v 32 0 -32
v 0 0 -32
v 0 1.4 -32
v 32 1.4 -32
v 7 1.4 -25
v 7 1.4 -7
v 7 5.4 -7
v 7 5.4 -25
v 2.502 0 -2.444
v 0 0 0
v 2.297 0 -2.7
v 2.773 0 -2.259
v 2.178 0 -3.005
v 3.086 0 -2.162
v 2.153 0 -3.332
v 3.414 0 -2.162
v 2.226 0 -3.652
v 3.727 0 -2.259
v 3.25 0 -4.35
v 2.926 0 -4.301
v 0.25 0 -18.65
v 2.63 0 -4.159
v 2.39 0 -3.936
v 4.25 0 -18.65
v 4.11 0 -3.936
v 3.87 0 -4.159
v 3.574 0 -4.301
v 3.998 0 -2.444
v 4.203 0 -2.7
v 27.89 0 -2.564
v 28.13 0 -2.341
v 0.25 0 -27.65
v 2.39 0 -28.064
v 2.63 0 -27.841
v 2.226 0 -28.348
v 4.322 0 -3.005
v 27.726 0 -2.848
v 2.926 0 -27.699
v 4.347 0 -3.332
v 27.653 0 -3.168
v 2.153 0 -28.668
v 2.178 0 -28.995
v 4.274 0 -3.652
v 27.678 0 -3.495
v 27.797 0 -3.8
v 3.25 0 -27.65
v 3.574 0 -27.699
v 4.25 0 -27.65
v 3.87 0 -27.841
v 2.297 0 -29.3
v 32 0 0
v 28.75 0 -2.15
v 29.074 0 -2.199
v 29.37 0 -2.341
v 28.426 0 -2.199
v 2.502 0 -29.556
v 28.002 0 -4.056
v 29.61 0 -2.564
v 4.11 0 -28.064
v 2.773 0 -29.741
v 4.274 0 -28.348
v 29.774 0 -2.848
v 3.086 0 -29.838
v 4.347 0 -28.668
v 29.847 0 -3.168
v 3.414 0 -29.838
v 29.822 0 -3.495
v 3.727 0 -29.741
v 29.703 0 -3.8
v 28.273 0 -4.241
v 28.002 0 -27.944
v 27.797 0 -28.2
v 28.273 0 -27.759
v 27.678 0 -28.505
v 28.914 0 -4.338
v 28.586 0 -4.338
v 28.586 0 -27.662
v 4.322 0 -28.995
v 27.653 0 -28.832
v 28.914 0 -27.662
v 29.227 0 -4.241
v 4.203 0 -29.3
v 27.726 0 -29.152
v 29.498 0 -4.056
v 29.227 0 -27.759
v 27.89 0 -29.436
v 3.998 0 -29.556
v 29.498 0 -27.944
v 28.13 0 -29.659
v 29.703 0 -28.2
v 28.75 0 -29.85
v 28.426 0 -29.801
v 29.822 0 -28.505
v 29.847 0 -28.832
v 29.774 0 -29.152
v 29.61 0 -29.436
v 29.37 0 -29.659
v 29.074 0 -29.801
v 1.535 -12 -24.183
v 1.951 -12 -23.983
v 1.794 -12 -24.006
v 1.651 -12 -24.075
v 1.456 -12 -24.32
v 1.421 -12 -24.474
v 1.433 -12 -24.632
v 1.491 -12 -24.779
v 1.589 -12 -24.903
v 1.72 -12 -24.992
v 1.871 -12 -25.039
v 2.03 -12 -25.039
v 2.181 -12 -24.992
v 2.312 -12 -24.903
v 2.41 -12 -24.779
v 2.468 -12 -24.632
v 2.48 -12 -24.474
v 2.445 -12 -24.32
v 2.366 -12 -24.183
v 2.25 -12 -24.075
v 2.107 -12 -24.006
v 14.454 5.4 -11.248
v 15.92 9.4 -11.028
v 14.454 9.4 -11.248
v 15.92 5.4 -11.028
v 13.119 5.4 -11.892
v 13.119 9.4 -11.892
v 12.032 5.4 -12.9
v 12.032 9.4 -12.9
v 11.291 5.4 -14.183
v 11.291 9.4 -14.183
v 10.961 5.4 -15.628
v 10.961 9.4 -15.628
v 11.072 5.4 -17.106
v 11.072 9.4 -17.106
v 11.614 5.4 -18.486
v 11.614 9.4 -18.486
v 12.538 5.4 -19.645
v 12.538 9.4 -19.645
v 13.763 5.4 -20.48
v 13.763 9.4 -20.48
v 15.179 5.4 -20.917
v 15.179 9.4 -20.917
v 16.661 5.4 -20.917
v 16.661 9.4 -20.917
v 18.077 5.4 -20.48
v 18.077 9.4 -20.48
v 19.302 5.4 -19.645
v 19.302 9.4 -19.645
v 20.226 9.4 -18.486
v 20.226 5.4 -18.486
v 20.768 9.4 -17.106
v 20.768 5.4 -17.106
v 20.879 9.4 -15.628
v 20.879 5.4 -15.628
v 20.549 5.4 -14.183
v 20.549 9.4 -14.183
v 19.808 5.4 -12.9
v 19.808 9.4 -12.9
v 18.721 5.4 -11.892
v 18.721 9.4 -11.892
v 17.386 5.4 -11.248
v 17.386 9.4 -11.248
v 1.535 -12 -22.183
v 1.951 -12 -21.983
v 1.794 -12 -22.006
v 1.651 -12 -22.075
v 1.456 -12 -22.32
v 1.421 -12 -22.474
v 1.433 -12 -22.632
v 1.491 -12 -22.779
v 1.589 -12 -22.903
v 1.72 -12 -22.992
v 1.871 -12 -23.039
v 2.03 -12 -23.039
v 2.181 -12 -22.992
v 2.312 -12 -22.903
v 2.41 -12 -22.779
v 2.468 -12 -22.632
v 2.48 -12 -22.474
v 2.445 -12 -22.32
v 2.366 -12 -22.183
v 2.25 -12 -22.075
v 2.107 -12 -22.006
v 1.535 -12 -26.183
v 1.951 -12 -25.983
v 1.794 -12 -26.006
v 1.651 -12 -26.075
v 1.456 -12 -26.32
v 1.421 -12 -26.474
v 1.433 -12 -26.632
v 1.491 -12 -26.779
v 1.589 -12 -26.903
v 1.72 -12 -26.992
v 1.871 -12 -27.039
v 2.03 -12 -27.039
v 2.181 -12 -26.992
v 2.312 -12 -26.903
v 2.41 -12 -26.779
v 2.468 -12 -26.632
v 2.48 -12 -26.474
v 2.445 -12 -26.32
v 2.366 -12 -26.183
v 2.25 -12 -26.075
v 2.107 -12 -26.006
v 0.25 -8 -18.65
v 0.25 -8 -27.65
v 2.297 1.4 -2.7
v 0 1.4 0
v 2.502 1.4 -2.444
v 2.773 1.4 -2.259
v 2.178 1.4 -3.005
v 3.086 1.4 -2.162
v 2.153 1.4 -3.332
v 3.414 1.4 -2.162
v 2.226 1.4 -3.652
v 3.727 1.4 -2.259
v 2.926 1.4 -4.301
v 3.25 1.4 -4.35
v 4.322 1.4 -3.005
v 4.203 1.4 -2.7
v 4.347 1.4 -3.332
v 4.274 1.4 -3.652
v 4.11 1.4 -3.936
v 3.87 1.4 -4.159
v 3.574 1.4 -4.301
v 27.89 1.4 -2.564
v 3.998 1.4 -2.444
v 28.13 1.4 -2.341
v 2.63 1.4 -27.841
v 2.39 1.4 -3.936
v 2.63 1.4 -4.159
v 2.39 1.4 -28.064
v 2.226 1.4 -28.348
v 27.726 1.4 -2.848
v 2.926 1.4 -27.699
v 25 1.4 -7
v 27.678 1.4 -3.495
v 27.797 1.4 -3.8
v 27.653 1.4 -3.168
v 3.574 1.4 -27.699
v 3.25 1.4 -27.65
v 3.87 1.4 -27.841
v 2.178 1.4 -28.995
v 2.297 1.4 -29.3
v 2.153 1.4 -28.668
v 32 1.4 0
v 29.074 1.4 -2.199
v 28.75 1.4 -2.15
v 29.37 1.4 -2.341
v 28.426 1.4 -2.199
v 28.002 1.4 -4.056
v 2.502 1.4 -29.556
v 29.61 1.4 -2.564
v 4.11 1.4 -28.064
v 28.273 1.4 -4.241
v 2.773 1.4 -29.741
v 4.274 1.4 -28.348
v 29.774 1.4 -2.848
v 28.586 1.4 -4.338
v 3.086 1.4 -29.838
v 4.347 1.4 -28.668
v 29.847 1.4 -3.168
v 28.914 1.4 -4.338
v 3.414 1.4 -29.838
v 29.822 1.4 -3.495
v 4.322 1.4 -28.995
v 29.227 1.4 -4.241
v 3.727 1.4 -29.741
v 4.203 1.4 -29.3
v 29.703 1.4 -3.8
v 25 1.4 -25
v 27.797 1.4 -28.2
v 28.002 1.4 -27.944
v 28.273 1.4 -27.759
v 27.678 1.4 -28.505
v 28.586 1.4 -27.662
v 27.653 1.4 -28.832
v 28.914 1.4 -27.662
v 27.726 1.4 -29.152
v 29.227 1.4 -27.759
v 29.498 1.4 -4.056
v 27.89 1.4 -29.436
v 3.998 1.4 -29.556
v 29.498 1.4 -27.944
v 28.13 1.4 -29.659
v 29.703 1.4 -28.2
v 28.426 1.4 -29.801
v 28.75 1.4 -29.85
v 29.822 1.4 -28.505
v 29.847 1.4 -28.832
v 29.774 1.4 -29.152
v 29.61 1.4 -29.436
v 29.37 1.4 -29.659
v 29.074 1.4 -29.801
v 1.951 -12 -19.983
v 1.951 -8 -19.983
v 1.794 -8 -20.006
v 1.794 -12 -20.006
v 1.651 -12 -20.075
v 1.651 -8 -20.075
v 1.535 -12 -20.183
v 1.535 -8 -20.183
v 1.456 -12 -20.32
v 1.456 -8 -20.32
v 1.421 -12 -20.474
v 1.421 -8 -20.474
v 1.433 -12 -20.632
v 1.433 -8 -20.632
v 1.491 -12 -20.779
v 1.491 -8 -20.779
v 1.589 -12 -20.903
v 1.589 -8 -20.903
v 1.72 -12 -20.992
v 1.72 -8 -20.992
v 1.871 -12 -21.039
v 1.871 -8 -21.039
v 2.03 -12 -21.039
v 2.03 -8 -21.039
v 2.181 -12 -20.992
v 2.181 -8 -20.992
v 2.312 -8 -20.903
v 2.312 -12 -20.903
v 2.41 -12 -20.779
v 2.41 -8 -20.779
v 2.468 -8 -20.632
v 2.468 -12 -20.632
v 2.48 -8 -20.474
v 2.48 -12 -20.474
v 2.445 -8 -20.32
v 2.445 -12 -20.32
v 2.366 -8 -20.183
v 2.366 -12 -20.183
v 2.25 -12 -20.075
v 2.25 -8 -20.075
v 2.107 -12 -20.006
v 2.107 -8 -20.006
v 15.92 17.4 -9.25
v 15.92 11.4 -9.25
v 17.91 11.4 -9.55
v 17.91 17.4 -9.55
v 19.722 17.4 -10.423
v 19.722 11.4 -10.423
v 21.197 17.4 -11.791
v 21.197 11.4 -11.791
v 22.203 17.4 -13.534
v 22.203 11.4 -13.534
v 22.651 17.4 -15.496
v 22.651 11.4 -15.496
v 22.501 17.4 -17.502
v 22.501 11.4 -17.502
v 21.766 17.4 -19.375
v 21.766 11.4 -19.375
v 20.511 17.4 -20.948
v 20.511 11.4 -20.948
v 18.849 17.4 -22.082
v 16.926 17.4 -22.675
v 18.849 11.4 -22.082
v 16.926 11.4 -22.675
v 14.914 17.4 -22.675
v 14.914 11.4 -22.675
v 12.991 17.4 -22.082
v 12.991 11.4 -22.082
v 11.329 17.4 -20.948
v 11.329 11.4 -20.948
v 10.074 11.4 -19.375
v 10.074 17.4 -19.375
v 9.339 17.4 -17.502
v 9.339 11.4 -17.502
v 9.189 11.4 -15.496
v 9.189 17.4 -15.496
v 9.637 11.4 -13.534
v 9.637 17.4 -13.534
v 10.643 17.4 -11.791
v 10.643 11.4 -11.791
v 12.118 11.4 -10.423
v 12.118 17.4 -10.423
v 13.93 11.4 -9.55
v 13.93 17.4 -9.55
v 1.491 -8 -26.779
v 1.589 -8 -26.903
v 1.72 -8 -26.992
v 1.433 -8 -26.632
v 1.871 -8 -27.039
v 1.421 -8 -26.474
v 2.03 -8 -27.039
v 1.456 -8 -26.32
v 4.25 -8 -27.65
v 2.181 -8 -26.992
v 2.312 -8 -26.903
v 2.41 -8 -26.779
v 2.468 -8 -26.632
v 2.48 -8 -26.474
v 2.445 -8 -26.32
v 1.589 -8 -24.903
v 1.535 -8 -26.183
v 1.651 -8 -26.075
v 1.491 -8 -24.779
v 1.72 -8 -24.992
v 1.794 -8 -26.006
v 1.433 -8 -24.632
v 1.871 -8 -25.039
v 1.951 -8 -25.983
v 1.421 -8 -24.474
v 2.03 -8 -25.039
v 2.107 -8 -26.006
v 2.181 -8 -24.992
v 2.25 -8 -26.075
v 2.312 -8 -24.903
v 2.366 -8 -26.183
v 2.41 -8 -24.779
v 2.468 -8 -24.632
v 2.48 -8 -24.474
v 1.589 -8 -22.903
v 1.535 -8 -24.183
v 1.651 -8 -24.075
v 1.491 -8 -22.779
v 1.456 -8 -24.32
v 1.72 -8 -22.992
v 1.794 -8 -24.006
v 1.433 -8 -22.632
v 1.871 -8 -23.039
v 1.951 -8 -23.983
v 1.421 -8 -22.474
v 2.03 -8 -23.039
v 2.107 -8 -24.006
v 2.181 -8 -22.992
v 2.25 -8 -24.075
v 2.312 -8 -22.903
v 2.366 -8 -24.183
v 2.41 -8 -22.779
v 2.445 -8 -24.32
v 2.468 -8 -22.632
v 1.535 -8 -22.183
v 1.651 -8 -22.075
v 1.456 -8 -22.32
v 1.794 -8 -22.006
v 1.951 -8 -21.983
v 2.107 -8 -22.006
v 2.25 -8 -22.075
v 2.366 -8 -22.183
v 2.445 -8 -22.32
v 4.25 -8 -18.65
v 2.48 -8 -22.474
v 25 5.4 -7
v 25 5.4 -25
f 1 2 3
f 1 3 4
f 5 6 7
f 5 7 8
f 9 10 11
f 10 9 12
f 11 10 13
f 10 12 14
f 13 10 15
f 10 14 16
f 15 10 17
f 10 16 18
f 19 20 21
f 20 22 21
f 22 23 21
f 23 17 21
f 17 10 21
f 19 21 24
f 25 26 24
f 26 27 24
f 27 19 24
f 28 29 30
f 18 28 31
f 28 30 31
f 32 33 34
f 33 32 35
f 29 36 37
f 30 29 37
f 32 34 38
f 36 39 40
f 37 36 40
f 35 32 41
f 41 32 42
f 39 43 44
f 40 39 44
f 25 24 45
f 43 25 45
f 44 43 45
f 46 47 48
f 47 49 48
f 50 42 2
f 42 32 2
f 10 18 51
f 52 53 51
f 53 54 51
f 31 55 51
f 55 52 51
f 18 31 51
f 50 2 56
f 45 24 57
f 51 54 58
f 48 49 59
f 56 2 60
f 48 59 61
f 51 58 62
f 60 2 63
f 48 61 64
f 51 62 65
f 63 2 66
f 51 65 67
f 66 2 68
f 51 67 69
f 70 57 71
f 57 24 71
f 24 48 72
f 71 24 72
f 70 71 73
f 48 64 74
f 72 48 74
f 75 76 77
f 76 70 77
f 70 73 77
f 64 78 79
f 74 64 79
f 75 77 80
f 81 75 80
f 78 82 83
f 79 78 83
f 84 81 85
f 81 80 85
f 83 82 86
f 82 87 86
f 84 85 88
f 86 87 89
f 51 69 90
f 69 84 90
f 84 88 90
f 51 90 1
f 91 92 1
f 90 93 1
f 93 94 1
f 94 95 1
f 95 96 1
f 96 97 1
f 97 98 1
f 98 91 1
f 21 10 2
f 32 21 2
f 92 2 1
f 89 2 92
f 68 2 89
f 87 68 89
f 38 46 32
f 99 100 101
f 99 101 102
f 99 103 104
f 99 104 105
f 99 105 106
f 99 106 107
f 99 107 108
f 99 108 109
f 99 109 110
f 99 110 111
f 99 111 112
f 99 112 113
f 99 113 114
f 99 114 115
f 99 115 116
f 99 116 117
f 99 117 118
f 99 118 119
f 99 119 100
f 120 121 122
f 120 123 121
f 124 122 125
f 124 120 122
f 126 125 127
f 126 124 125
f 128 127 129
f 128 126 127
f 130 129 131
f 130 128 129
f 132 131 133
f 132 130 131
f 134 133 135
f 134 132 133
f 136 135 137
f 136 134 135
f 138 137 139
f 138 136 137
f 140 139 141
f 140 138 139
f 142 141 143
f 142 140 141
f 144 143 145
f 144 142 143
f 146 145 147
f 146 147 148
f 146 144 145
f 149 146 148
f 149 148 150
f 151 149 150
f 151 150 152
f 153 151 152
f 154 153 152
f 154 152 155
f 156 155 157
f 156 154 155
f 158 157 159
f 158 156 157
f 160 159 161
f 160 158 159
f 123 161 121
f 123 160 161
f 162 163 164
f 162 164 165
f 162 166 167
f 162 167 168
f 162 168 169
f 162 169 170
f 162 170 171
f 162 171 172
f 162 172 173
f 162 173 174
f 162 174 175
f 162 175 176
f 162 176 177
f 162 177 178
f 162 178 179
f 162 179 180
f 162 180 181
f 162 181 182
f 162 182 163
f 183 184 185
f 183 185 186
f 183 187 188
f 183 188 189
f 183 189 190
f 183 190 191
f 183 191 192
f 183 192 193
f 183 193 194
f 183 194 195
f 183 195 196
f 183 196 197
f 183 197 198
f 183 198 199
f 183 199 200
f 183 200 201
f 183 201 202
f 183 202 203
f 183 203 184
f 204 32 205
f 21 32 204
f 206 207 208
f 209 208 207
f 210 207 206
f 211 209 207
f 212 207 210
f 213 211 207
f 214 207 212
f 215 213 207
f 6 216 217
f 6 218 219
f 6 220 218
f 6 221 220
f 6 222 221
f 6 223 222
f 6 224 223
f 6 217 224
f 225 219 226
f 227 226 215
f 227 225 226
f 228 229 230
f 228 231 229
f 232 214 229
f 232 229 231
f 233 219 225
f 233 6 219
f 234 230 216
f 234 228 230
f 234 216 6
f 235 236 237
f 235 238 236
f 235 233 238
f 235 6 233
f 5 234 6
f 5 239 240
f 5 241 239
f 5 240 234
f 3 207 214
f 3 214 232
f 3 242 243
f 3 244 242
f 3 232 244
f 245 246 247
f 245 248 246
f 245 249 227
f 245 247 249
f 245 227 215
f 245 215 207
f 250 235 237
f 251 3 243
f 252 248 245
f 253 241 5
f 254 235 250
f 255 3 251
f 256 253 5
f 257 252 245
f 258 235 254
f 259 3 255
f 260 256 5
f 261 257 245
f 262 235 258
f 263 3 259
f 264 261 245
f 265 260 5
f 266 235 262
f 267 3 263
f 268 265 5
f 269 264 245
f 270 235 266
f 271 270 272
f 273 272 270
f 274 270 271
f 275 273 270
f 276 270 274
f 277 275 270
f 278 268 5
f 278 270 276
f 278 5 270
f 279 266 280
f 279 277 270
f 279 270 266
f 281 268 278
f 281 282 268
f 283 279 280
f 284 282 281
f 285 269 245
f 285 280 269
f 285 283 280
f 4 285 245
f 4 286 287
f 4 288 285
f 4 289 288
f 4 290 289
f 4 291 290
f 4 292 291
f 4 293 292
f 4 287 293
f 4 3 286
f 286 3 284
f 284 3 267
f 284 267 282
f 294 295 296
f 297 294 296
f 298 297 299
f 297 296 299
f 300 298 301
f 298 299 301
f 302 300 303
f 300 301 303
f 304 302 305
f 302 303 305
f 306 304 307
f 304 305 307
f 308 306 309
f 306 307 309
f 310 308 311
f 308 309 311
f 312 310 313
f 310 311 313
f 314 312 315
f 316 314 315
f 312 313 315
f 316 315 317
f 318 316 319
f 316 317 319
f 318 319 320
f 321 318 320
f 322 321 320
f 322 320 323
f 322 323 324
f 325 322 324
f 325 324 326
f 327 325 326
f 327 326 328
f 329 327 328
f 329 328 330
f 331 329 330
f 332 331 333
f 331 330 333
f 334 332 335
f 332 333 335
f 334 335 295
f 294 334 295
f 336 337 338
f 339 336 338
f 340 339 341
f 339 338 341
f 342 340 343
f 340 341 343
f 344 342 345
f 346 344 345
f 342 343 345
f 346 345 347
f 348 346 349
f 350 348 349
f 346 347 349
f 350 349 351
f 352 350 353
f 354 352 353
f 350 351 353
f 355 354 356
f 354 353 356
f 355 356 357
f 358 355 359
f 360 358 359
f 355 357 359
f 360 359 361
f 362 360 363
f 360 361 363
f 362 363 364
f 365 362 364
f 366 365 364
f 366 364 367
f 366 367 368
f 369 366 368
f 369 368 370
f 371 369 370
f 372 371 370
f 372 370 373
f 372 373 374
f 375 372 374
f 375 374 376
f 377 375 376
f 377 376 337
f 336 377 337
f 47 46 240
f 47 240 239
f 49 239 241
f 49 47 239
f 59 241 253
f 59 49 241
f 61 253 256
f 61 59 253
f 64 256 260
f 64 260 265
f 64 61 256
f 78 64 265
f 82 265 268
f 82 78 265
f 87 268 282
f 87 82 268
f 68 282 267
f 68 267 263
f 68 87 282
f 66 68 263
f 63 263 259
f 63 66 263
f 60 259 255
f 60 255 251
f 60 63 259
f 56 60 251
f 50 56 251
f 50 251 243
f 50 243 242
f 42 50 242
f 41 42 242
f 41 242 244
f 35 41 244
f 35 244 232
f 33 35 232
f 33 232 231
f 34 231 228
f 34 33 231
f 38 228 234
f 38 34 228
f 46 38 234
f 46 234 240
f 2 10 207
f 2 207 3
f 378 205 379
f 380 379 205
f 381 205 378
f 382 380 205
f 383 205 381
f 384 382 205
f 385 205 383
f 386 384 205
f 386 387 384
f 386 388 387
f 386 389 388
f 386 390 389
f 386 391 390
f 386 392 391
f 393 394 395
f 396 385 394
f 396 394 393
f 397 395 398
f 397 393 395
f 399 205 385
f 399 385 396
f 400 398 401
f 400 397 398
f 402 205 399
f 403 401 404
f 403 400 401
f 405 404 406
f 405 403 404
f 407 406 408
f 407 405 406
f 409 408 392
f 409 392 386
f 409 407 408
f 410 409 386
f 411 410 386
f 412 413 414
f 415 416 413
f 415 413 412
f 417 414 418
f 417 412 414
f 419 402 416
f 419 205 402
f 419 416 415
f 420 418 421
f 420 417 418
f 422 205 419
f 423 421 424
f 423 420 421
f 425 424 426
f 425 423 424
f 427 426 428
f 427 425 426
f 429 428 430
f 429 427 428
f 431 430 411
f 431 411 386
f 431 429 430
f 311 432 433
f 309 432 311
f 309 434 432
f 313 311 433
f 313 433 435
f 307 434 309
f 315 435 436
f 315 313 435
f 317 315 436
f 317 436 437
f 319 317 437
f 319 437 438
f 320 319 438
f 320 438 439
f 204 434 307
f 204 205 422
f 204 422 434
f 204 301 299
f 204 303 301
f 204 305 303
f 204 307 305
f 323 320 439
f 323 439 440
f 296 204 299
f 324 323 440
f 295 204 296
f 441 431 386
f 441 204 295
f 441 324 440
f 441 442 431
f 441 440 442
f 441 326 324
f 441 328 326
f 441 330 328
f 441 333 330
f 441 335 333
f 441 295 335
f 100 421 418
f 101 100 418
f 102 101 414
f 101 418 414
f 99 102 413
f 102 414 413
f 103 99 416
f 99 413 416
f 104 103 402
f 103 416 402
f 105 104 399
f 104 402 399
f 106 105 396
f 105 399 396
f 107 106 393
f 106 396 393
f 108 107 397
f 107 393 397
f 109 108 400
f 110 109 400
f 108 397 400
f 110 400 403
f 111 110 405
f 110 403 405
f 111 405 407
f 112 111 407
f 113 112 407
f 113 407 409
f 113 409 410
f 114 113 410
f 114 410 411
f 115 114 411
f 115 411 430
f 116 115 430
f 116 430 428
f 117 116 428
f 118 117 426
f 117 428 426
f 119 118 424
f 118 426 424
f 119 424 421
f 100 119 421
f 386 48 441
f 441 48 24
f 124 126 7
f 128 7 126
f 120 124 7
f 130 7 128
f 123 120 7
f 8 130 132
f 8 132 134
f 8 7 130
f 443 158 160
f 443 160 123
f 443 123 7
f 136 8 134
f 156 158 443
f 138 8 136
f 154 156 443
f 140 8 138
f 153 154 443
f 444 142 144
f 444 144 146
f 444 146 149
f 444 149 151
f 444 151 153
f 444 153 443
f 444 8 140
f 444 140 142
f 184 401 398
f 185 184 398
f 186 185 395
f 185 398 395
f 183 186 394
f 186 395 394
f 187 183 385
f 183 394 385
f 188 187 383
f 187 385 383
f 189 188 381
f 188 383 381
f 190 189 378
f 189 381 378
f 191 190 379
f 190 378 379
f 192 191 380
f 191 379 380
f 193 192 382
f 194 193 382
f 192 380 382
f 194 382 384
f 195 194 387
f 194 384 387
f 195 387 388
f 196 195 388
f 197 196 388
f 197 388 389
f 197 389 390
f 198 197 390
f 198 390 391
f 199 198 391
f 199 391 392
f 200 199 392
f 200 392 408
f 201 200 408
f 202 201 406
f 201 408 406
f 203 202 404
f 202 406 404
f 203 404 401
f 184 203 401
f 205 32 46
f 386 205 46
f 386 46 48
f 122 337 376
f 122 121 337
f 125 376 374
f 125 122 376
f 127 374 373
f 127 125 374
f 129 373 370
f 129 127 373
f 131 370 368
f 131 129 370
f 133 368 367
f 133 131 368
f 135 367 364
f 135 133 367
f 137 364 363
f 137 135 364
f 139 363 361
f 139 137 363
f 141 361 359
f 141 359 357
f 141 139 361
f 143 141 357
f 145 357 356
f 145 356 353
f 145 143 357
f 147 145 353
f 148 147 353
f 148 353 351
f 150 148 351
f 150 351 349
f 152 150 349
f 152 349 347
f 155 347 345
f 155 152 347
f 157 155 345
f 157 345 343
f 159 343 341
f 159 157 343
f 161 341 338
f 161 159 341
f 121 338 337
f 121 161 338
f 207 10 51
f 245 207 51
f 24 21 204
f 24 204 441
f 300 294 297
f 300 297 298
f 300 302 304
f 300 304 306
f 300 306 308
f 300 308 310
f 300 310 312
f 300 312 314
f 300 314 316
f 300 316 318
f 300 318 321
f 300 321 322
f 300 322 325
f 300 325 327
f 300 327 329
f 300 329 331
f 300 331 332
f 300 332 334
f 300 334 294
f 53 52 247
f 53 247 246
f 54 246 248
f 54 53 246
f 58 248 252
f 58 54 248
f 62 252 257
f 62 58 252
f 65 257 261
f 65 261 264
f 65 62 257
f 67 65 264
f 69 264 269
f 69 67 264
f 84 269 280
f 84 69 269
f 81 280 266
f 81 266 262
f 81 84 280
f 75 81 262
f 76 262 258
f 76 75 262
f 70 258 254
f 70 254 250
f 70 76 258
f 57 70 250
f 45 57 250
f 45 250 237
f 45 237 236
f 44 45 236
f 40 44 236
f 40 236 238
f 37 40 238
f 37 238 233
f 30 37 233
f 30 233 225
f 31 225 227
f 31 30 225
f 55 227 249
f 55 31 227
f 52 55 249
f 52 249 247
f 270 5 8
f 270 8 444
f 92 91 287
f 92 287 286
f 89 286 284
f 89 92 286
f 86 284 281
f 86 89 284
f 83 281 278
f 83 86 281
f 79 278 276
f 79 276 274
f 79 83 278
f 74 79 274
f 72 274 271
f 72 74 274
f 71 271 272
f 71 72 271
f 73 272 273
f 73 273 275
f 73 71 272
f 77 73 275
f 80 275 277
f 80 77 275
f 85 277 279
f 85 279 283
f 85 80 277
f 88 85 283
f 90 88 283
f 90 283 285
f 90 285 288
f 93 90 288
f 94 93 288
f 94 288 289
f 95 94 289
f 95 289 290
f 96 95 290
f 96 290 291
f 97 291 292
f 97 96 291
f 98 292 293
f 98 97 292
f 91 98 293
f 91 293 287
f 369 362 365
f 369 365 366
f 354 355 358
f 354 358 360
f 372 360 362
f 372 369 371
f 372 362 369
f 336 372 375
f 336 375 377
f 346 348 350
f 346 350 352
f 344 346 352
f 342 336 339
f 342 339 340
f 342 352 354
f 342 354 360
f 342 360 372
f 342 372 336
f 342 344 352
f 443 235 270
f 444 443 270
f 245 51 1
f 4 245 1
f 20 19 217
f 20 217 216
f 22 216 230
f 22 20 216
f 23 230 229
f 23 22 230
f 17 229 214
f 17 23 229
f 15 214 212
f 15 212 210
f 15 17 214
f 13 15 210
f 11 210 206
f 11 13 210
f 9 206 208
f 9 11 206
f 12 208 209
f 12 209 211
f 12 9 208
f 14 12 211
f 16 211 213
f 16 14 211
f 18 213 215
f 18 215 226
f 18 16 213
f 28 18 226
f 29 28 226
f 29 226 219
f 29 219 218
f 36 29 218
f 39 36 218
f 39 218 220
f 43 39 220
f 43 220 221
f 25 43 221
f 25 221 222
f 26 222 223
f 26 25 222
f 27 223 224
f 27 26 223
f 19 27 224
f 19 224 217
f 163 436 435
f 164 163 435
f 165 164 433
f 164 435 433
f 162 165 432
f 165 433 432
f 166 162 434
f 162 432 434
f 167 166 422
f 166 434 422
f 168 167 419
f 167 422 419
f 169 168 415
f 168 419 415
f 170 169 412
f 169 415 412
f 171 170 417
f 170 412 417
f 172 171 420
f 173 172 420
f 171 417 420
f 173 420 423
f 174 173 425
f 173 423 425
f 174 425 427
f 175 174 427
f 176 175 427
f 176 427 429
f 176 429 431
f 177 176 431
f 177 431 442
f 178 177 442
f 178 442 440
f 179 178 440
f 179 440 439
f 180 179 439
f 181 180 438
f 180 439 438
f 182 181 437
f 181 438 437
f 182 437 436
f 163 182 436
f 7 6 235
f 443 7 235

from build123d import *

# Parameters (mm, degrees)
SKETCH_1_W      = 32
SKETCH_1_H      = 32
SKETCH_1_R      = 1.1
EXTRUDE_1_DEPTH = 1.4
SKETCH_2_W      = 18
SKETCH_2_H      = 18
EXTRUDE_2_DEPTH = 4
SKETCH_3_R      = 6.75
EXTRUDE_3_DEPTH = 12
SKETCH_5_W      = 4
SKETCH_5_H      = 9
EXTRUDE_4_DEPTH = 8
SKETCH_6_R      = 0.531026099
EXTRUDE_5_DEPTH = 4


with BuildPart() as part:
    # 草图1 → 凸台-拉伸1 (new body)
    with BuildSketch(Plane(origin=(0, 0, 0), x_dir=(1, 0, 0), z_dir=(0, 1, 0))):
        with Locations((16, 16)):
            Rectangle(SKETCH_1_W, SKETCH_1_H)
        with Locations(Location((3.25, 28.75, 0), (0, 0, 270))):
            Circle(SKETCH_1_R, mode=Mode.SUBTRACT)
        with Locations(Location((28.75, 28.75, 0), (0, 0, 90))):
            Circle(SKETCH_1_R, mode=Mode.SUBTRACT)
        with Locations(Location((28.75, 3.25, 0), (0, 0, 270))):
            Circle(SKETCH_1_R, mode=Mode.SUBTRACT)
        with Locations(Location((3.25, 3.25, 0), (0, 0, 90))):
            Circle(SKETCH_1_R, mode=Mode.SUBTRACT)
    extrude(amount=EXTRUDE_1_DEPTH)

    # 草图2 → 凸台-拉伸2 (add)
    with BuildSketch(Plane(origin=(0, 1.4, 0), x_dir=(1, 0, 0), z_dir=(0, 1, 0))):
        with Locations((16, 16)):
            Rectangle(SKETCH_2_W, SKETCH_2_H)
    extrude(amount=EXTRUDE_2_DEPTH)

    # 草图3 → 凸台-拉伸3 (add)
    with BuildSketch(Plane(origin=(0, 5.4, 0), x_dir=(1, 0, 0), z_dir=(0, 1, 0))):
        with Locations(Location((15.920011352, 16, 0), (0, 0, 270))):
            Circle(SKETCH_3_R)
    extrude(amount=EXTRUDE_3_DEPTH)

    # 草图4 → 切除-旋转1 (revolve, cut)
    with BuildSketch(Plane.XY.offset(-16), mode=Mode.PRIVATE) as cut_revolve_1_sk:
        Polygon((9.170011352, 11.4), (10.947526868, 9.4), (10.947526868, 5.4), (9.170011352, 5.4), align=None)
    revolve(cut_revolve_1_sk.sketch.rotate(Axis((15.920011352, 17.4, -16), (0, -1, 0)), 270), axis=Axis((15.920011352, 17.4, -16), (0, -1, 0)), mode=Mode.SUBTRACT)

    # 草图5 → 凸台-拉伸4 (add)
    with BuildSketch(Plane.XZ):
        with Locations((2.249894635, -23.15)):
            Rectangle(SKETCH_5_W, SKETCH_5_H)
    extrude(amount=EXTRUDE_4_DEPTH)

    # 草图6 → 凸台-拉伸5 (add)
    with BuildSketch(Plane.XZ.offset(8)):
        with Locations(Location((1.950545413, -20.513721841, 0), (0, 0, 90))):
            Circle(SKETCH_6_R)
        with Locations(Location((1.950545413, -22.513721841, 0), (0, 0, 90))):
            Circle(SKETCH_6_R)
        with Locations(Location((1.950545413, -24.513721841, 0), (0, 0, 90))):
            Circle(SKETCH_6_R)
        with Locations(Location((1.950545413, -26.513721841, 0), (0, 0, 90))):
            Circle(SKETCH_6_R)
    extrude(amount=EXTRUDE_5_DEPTH)


solid = part.part
